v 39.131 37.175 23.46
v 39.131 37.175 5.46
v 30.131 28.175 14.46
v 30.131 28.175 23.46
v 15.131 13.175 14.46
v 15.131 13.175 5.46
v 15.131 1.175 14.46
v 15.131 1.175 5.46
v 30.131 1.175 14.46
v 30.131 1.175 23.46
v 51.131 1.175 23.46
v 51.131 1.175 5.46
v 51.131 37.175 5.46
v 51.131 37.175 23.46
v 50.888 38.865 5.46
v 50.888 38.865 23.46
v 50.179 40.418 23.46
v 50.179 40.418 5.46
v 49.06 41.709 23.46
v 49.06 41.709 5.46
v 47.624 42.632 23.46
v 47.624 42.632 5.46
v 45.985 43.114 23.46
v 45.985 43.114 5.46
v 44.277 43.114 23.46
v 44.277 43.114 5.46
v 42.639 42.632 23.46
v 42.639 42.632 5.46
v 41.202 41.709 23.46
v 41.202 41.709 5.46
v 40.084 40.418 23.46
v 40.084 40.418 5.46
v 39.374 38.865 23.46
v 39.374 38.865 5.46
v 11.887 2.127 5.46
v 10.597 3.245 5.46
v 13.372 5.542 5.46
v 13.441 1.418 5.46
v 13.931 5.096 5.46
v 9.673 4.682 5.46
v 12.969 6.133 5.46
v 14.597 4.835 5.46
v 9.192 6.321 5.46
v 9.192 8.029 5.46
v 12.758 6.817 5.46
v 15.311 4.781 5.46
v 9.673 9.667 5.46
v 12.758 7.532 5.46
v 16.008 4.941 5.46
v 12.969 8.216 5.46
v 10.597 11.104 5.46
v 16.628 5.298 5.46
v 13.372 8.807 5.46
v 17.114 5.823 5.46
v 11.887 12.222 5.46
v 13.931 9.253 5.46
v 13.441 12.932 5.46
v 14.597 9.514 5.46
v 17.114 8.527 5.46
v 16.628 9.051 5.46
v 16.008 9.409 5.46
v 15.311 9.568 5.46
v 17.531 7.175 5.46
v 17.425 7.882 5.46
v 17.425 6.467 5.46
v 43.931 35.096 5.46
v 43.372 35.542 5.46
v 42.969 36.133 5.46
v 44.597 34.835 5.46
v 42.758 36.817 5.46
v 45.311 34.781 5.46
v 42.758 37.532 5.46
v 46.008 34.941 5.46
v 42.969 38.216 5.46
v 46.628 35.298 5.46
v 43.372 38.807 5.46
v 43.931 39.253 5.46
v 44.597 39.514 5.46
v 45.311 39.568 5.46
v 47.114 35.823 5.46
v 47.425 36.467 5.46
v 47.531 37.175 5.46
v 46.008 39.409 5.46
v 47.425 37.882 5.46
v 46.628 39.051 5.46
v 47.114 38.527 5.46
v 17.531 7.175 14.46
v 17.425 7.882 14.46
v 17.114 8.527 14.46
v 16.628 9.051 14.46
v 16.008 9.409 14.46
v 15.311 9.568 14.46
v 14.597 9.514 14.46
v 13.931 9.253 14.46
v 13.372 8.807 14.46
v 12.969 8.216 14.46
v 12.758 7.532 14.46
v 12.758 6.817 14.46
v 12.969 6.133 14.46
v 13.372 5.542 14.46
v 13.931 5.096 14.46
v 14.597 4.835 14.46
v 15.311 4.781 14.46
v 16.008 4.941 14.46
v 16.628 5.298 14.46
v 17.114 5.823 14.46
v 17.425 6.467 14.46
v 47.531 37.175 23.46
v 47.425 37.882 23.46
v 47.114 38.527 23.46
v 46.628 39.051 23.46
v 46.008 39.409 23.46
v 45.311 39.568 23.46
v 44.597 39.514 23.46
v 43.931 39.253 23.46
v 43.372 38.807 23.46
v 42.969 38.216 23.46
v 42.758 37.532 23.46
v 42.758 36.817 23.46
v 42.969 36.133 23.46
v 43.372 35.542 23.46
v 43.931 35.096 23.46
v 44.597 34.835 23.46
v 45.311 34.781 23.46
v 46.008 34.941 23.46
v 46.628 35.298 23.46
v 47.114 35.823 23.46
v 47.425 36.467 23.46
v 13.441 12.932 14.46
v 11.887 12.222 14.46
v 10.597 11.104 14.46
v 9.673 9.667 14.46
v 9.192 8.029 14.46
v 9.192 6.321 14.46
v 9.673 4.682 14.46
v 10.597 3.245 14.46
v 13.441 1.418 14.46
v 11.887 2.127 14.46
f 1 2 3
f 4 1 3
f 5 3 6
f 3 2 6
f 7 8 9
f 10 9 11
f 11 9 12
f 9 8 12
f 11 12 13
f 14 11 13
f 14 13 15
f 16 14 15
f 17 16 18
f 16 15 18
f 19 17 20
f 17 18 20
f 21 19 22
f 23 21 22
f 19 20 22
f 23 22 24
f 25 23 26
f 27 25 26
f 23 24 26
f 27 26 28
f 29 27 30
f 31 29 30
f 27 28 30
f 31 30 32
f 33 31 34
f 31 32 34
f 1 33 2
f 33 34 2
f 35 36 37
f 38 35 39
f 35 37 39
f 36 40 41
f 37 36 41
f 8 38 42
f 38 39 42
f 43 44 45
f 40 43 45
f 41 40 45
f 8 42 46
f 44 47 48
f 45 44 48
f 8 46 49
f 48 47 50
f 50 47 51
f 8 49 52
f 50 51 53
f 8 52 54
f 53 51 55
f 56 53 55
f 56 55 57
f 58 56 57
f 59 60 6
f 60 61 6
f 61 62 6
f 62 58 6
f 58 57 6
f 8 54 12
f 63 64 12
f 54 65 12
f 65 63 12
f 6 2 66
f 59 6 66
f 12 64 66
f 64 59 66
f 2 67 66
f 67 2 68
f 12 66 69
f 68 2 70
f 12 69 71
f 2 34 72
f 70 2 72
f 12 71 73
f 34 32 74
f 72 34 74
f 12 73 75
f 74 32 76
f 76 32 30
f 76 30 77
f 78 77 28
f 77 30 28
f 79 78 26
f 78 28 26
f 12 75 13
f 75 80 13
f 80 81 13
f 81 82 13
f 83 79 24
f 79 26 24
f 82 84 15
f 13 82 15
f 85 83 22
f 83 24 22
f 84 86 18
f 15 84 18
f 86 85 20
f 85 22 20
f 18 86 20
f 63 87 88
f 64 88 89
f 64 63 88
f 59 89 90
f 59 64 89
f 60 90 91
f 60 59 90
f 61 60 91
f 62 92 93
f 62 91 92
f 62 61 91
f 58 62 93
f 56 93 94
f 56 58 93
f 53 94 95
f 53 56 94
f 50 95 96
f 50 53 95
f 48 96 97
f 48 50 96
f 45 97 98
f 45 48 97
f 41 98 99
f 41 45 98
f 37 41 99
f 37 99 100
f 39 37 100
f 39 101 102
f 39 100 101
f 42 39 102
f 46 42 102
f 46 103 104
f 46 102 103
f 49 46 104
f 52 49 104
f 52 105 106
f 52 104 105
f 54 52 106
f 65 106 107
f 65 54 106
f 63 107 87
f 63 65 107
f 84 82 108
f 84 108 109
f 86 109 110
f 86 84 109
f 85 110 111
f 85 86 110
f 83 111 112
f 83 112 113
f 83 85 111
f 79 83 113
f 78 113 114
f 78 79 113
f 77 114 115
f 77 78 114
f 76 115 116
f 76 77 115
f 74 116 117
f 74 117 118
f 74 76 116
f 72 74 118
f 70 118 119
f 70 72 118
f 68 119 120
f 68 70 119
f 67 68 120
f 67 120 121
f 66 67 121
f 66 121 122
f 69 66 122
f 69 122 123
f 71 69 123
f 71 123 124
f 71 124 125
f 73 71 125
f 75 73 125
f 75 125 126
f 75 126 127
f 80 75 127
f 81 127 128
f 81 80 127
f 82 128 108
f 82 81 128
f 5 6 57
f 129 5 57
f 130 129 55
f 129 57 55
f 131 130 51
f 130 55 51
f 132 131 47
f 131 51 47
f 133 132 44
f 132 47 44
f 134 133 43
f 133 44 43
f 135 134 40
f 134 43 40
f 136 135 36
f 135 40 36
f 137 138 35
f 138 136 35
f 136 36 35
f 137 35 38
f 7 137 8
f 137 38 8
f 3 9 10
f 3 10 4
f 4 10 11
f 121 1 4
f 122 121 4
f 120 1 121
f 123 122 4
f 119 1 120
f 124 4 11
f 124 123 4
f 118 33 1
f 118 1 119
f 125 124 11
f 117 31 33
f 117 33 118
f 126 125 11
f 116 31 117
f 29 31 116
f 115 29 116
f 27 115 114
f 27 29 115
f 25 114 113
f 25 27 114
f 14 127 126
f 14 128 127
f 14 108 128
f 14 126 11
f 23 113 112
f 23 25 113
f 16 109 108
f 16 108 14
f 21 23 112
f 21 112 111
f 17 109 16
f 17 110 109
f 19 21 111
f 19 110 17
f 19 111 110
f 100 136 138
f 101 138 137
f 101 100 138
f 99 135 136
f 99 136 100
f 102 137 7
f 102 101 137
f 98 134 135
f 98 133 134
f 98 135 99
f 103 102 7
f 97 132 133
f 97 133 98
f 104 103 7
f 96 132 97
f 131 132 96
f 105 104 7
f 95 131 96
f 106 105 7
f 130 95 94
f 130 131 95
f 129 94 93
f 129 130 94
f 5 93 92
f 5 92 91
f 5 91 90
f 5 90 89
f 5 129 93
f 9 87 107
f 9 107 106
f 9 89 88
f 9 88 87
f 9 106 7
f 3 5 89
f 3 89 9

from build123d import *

# Parameters (mm, degrees)
SKETCH1_R           = 4
BOSS_EXTRUDE1_DEPTH = 30
CUT_EXTRUDE3_START  = -15
CUT_EXTRUDE3_DEPTH  = 15
ECHELLE1_SCALE      = 0.6


with BuildPart() as part:
    # Sketch1 → Boss-Extrude1 (new body)
    with BuildSketch(Plane.XY):
        with BuildLine():
            Line((0, -10), (60, -10))
            Line((60, -10), (60, 50))
            ThreePointArc((60, 50), (50, 60), (40, 50))
            Line((40, 50), (0, 10))
            ThreePointArc((0, 10), (-10, 0), (0, -10))
        make_face()
        with Locations((50, 50)):
            Circle(SKETCH1_R, mode=Mode.SUBTRACT)
        Circle(SKETCH1_R, mode=Mode.SUBTRACT)
    extrude(amount=BOSS_EXTRUDE1_DEPTH)

    # Sketch3 → Cut-Extrude3 (cut)
    with BuildSketch(Plane.XY.offset(30).offset(CUT_EXTRUDE3_START)):
        with BuildLine():
            Line((60, -217.989898732), (60, -10))
            Line((60, -10), (60, 50))
            ThreePointArc((60, 50), (50, 60), (40, 50))
            Line((40, 50), (0, 10))
            ThreePointArc((0, 10), (-10, 0), (0, -10))
            Line((0, -10), (60, -10))
            Line((60, -10), (25, -10))
            Line((25, -10), (25, 35))
            Line((25, 35), (25, 242.989898732))
            Line((25, 242.989898732), (-389.785969286, 211.497176047))
            Line((-389.785969286, 211.497176047), (-354.785969286, -249.482621417))
            Line((-354.785969286, -249.482621417), (60, -217.989898732))
        make_face()
    extrude(amount=CUT_EXTRUDE3_DEPTH, mode=Mode.SUBTRACT)


with BuildPart() as part_1:
    # Echelle1: scaled about (37.827967632, 17.936559761, 13.650169575)
    add(part.part.scale(ECHELLE1_SCALE).moved(Location((15.131187053, 7.174623904, 5.46006783))))


solid = part_1.part
